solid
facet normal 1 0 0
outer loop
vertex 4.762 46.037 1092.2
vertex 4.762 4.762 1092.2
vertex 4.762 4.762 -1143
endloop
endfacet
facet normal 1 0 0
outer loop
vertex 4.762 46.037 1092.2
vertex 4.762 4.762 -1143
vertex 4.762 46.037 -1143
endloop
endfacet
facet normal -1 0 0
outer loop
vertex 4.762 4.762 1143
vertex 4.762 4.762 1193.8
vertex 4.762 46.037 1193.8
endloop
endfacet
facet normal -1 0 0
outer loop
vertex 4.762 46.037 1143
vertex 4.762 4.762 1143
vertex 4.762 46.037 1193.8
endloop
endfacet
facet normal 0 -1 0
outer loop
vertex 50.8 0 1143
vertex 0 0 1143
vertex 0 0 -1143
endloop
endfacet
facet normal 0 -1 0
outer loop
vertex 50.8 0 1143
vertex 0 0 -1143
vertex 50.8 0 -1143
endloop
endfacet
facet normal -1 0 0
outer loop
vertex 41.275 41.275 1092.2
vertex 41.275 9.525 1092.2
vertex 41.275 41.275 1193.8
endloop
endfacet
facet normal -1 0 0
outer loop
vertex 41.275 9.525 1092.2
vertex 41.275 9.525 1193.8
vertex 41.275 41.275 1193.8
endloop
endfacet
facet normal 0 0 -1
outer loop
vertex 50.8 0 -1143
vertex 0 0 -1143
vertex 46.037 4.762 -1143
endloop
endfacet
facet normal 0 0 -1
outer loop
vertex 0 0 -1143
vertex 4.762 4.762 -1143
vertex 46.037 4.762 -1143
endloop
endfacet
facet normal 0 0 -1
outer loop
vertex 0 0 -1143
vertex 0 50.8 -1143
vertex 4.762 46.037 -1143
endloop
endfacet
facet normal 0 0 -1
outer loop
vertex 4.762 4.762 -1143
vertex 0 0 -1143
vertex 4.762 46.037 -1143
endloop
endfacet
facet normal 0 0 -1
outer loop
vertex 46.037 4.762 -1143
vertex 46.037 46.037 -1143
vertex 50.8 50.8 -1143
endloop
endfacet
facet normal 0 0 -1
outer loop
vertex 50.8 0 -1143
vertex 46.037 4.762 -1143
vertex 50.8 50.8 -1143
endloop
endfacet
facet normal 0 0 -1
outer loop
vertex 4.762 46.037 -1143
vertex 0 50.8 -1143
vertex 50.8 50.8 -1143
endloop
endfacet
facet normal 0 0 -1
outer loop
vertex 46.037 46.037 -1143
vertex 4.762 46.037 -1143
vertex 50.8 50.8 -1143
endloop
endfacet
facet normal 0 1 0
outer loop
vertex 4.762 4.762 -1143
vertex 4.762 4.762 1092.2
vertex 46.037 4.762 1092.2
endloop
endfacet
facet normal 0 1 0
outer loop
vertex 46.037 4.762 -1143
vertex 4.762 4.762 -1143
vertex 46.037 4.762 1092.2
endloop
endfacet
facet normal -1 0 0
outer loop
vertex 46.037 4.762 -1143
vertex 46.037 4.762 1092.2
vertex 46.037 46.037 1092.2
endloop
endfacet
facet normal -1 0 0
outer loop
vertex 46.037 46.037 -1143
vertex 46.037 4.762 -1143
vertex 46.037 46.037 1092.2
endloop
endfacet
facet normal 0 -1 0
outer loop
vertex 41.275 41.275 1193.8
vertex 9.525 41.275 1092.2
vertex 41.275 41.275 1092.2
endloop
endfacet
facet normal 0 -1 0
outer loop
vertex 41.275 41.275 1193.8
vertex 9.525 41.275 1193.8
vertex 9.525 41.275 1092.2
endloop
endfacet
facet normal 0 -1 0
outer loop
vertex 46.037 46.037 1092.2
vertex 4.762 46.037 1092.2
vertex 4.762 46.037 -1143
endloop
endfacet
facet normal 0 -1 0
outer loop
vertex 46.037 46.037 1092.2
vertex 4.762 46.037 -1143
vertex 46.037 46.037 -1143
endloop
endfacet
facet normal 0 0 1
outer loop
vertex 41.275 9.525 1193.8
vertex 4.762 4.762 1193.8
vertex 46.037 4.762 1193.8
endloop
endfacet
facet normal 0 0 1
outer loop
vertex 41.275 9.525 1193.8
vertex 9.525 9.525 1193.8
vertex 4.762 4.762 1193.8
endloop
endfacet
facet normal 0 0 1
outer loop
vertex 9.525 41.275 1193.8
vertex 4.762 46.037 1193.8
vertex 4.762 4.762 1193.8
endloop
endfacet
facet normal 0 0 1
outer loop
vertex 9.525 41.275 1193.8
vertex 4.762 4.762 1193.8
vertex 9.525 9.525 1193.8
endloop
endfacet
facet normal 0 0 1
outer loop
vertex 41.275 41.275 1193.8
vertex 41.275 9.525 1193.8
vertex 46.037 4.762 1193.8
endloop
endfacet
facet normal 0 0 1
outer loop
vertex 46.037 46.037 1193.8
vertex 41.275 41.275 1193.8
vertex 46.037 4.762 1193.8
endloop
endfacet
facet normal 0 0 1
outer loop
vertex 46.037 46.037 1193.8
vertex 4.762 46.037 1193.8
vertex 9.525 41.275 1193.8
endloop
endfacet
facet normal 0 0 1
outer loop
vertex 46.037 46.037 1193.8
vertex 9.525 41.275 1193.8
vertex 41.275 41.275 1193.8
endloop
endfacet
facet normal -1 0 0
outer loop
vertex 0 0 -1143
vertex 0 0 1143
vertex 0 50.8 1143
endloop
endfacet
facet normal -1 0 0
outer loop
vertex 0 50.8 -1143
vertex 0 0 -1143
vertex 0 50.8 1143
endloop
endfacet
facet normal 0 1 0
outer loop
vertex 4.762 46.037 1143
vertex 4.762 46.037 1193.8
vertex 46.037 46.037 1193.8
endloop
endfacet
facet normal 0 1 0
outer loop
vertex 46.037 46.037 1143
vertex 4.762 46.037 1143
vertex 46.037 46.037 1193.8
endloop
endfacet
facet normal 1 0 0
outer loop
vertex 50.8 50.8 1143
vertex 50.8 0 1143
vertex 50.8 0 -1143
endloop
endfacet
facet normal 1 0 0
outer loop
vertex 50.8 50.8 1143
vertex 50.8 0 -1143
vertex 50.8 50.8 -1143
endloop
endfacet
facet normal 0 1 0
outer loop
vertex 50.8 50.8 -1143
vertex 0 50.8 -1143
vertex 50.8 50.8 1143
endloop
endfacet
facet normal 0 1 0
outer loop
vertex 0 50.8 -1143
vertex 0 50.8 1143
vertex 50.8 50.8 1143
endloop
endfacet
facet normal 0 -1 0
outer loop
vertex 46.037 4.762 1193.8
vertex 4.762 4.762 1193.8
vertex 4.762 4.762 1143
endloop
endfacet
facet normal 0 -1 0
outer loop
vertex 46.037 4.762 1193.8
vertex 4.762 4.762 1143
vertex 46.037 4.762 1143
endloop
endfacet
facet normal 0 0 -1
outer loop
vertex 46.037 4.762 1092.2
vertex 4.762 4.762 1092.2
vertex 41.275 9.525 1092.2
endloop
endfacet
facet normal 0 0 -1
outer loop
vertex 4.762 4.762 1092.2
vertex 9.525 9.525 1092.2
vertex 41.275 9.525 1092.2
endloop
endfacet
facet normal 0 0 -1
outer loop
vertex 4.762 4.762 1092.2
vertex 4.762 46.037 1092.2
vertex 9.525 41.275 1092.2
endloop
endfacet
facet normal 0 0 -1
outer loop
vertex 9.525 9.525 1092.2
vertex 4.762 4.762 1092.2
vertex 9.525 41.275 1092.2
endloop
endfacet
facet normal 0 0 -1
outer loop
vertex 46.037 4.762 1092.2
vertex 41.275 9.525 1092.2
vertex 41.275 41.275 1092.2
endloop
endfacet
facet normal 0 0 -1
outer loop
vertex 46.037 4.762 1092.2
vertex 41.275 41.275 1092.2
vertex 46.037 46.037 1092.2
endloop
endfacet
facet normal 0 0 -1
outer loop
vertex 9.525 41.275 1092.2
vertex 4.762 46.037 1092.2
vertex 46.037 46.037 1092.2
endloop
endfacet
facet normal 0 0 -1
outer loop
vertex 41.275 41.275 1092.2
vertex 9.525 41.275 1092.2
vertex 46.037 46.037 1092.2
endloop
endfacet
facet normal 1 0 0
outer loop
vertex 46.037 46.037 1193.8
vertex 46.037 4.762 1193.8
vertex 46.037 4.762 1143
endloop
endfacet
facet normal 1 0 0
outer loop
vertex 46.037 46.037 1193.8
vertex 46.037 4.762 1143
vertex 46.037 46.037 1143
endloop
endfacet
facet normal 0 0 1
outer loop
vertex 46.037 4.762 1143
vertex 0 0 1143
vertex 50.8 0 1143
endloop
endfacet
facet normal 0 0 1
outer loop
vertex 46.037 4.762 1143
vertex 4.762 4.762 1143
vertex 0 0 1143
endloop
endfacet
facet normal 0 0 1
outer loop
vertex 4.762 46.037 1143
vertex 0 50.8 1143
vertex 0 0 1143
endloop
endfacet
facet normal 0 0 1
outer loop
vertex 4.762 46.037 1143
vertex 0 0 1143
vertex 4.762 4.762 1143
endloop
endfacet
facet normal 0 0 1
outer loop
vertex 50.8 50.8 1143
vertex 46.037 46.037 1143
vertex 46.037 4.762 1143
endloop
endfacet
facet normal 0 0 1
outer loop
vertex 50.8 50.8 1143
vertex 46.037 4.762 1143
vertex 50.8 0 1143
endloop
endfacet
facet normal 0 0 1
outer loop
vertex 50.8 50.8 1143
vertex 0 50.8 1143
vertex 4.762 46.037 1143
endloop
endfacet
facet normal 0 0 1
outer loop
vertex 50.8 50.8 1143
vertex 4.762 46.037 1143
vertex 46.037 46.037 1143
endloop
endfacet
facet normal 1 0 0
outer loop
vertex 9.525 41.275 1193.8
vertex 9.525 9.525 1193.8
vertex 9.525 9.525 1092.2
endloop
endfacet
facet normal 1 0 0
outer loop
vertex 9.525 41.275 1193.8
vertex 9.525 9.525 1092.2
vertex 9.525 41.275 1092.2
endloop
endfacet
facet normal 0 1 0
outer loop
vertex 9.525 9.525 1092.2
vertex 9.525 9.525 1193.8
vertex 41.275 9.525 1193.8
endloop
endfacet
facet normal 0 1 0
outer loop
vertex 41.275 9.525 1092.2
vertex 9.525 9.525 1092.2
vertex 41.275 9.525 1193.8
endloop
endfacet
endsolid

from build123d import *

# Parameters (mm, degrees)
SKETCH1_W           = 50.799956
SKETCH1_H           = 50.799956
SKETCH1_W_2         = 41.274956
SKETCH1_H_2         = 41.274956
BASETUBE_DEPTH      = 1143
BOSS_EXTRUDE2_START = 1143
SKETCH1_3_W         = 41.274956
SKETCH1_3_H         = 41.274956
SKETCH1_3_W_2       = 31.749956
SKETCH1_3_H_2       = 31.749956
BOSS_EXTRUDE2_DEPTH = 50.8


with BuildPart() as part:
    # Sketch1 → BaseTube (new, symmetric)
    with BuildSketch(Plane.XY):
        with Locations((25.399978, 25.399978)):
            Rectangle(SKETCH1_W, SKETCH1_H)
        with Locations((25.399978, 25.399978)):
            Rectangle(SKETCH1_W_2, SKETCH1_H_2, mode=Mode.SUBTRACT)
    extrude(amount=BASETUBE_DEPTH, both=True)

    # Sketch1<3> → Boss-Extrude2 (add, symmetric)
    with BuildSketch(Plane.XY.offset(BOSS_EXTRUDE2_START)):
        with Locations((25.399978, 25.399978)):
            Rectangle(SKETCH1_3_W, SKETCH1_3_H)
        with Locations((25.399978, 25.399978)):
            Rectangle(SKETCH1_3_W_2, SKETCH1_3_H_2, mode=Mode.SUBTRACT)
    extrude(amount=BOSS_EXTRUDE2_DEPTH, both=True)


solid = part.part
